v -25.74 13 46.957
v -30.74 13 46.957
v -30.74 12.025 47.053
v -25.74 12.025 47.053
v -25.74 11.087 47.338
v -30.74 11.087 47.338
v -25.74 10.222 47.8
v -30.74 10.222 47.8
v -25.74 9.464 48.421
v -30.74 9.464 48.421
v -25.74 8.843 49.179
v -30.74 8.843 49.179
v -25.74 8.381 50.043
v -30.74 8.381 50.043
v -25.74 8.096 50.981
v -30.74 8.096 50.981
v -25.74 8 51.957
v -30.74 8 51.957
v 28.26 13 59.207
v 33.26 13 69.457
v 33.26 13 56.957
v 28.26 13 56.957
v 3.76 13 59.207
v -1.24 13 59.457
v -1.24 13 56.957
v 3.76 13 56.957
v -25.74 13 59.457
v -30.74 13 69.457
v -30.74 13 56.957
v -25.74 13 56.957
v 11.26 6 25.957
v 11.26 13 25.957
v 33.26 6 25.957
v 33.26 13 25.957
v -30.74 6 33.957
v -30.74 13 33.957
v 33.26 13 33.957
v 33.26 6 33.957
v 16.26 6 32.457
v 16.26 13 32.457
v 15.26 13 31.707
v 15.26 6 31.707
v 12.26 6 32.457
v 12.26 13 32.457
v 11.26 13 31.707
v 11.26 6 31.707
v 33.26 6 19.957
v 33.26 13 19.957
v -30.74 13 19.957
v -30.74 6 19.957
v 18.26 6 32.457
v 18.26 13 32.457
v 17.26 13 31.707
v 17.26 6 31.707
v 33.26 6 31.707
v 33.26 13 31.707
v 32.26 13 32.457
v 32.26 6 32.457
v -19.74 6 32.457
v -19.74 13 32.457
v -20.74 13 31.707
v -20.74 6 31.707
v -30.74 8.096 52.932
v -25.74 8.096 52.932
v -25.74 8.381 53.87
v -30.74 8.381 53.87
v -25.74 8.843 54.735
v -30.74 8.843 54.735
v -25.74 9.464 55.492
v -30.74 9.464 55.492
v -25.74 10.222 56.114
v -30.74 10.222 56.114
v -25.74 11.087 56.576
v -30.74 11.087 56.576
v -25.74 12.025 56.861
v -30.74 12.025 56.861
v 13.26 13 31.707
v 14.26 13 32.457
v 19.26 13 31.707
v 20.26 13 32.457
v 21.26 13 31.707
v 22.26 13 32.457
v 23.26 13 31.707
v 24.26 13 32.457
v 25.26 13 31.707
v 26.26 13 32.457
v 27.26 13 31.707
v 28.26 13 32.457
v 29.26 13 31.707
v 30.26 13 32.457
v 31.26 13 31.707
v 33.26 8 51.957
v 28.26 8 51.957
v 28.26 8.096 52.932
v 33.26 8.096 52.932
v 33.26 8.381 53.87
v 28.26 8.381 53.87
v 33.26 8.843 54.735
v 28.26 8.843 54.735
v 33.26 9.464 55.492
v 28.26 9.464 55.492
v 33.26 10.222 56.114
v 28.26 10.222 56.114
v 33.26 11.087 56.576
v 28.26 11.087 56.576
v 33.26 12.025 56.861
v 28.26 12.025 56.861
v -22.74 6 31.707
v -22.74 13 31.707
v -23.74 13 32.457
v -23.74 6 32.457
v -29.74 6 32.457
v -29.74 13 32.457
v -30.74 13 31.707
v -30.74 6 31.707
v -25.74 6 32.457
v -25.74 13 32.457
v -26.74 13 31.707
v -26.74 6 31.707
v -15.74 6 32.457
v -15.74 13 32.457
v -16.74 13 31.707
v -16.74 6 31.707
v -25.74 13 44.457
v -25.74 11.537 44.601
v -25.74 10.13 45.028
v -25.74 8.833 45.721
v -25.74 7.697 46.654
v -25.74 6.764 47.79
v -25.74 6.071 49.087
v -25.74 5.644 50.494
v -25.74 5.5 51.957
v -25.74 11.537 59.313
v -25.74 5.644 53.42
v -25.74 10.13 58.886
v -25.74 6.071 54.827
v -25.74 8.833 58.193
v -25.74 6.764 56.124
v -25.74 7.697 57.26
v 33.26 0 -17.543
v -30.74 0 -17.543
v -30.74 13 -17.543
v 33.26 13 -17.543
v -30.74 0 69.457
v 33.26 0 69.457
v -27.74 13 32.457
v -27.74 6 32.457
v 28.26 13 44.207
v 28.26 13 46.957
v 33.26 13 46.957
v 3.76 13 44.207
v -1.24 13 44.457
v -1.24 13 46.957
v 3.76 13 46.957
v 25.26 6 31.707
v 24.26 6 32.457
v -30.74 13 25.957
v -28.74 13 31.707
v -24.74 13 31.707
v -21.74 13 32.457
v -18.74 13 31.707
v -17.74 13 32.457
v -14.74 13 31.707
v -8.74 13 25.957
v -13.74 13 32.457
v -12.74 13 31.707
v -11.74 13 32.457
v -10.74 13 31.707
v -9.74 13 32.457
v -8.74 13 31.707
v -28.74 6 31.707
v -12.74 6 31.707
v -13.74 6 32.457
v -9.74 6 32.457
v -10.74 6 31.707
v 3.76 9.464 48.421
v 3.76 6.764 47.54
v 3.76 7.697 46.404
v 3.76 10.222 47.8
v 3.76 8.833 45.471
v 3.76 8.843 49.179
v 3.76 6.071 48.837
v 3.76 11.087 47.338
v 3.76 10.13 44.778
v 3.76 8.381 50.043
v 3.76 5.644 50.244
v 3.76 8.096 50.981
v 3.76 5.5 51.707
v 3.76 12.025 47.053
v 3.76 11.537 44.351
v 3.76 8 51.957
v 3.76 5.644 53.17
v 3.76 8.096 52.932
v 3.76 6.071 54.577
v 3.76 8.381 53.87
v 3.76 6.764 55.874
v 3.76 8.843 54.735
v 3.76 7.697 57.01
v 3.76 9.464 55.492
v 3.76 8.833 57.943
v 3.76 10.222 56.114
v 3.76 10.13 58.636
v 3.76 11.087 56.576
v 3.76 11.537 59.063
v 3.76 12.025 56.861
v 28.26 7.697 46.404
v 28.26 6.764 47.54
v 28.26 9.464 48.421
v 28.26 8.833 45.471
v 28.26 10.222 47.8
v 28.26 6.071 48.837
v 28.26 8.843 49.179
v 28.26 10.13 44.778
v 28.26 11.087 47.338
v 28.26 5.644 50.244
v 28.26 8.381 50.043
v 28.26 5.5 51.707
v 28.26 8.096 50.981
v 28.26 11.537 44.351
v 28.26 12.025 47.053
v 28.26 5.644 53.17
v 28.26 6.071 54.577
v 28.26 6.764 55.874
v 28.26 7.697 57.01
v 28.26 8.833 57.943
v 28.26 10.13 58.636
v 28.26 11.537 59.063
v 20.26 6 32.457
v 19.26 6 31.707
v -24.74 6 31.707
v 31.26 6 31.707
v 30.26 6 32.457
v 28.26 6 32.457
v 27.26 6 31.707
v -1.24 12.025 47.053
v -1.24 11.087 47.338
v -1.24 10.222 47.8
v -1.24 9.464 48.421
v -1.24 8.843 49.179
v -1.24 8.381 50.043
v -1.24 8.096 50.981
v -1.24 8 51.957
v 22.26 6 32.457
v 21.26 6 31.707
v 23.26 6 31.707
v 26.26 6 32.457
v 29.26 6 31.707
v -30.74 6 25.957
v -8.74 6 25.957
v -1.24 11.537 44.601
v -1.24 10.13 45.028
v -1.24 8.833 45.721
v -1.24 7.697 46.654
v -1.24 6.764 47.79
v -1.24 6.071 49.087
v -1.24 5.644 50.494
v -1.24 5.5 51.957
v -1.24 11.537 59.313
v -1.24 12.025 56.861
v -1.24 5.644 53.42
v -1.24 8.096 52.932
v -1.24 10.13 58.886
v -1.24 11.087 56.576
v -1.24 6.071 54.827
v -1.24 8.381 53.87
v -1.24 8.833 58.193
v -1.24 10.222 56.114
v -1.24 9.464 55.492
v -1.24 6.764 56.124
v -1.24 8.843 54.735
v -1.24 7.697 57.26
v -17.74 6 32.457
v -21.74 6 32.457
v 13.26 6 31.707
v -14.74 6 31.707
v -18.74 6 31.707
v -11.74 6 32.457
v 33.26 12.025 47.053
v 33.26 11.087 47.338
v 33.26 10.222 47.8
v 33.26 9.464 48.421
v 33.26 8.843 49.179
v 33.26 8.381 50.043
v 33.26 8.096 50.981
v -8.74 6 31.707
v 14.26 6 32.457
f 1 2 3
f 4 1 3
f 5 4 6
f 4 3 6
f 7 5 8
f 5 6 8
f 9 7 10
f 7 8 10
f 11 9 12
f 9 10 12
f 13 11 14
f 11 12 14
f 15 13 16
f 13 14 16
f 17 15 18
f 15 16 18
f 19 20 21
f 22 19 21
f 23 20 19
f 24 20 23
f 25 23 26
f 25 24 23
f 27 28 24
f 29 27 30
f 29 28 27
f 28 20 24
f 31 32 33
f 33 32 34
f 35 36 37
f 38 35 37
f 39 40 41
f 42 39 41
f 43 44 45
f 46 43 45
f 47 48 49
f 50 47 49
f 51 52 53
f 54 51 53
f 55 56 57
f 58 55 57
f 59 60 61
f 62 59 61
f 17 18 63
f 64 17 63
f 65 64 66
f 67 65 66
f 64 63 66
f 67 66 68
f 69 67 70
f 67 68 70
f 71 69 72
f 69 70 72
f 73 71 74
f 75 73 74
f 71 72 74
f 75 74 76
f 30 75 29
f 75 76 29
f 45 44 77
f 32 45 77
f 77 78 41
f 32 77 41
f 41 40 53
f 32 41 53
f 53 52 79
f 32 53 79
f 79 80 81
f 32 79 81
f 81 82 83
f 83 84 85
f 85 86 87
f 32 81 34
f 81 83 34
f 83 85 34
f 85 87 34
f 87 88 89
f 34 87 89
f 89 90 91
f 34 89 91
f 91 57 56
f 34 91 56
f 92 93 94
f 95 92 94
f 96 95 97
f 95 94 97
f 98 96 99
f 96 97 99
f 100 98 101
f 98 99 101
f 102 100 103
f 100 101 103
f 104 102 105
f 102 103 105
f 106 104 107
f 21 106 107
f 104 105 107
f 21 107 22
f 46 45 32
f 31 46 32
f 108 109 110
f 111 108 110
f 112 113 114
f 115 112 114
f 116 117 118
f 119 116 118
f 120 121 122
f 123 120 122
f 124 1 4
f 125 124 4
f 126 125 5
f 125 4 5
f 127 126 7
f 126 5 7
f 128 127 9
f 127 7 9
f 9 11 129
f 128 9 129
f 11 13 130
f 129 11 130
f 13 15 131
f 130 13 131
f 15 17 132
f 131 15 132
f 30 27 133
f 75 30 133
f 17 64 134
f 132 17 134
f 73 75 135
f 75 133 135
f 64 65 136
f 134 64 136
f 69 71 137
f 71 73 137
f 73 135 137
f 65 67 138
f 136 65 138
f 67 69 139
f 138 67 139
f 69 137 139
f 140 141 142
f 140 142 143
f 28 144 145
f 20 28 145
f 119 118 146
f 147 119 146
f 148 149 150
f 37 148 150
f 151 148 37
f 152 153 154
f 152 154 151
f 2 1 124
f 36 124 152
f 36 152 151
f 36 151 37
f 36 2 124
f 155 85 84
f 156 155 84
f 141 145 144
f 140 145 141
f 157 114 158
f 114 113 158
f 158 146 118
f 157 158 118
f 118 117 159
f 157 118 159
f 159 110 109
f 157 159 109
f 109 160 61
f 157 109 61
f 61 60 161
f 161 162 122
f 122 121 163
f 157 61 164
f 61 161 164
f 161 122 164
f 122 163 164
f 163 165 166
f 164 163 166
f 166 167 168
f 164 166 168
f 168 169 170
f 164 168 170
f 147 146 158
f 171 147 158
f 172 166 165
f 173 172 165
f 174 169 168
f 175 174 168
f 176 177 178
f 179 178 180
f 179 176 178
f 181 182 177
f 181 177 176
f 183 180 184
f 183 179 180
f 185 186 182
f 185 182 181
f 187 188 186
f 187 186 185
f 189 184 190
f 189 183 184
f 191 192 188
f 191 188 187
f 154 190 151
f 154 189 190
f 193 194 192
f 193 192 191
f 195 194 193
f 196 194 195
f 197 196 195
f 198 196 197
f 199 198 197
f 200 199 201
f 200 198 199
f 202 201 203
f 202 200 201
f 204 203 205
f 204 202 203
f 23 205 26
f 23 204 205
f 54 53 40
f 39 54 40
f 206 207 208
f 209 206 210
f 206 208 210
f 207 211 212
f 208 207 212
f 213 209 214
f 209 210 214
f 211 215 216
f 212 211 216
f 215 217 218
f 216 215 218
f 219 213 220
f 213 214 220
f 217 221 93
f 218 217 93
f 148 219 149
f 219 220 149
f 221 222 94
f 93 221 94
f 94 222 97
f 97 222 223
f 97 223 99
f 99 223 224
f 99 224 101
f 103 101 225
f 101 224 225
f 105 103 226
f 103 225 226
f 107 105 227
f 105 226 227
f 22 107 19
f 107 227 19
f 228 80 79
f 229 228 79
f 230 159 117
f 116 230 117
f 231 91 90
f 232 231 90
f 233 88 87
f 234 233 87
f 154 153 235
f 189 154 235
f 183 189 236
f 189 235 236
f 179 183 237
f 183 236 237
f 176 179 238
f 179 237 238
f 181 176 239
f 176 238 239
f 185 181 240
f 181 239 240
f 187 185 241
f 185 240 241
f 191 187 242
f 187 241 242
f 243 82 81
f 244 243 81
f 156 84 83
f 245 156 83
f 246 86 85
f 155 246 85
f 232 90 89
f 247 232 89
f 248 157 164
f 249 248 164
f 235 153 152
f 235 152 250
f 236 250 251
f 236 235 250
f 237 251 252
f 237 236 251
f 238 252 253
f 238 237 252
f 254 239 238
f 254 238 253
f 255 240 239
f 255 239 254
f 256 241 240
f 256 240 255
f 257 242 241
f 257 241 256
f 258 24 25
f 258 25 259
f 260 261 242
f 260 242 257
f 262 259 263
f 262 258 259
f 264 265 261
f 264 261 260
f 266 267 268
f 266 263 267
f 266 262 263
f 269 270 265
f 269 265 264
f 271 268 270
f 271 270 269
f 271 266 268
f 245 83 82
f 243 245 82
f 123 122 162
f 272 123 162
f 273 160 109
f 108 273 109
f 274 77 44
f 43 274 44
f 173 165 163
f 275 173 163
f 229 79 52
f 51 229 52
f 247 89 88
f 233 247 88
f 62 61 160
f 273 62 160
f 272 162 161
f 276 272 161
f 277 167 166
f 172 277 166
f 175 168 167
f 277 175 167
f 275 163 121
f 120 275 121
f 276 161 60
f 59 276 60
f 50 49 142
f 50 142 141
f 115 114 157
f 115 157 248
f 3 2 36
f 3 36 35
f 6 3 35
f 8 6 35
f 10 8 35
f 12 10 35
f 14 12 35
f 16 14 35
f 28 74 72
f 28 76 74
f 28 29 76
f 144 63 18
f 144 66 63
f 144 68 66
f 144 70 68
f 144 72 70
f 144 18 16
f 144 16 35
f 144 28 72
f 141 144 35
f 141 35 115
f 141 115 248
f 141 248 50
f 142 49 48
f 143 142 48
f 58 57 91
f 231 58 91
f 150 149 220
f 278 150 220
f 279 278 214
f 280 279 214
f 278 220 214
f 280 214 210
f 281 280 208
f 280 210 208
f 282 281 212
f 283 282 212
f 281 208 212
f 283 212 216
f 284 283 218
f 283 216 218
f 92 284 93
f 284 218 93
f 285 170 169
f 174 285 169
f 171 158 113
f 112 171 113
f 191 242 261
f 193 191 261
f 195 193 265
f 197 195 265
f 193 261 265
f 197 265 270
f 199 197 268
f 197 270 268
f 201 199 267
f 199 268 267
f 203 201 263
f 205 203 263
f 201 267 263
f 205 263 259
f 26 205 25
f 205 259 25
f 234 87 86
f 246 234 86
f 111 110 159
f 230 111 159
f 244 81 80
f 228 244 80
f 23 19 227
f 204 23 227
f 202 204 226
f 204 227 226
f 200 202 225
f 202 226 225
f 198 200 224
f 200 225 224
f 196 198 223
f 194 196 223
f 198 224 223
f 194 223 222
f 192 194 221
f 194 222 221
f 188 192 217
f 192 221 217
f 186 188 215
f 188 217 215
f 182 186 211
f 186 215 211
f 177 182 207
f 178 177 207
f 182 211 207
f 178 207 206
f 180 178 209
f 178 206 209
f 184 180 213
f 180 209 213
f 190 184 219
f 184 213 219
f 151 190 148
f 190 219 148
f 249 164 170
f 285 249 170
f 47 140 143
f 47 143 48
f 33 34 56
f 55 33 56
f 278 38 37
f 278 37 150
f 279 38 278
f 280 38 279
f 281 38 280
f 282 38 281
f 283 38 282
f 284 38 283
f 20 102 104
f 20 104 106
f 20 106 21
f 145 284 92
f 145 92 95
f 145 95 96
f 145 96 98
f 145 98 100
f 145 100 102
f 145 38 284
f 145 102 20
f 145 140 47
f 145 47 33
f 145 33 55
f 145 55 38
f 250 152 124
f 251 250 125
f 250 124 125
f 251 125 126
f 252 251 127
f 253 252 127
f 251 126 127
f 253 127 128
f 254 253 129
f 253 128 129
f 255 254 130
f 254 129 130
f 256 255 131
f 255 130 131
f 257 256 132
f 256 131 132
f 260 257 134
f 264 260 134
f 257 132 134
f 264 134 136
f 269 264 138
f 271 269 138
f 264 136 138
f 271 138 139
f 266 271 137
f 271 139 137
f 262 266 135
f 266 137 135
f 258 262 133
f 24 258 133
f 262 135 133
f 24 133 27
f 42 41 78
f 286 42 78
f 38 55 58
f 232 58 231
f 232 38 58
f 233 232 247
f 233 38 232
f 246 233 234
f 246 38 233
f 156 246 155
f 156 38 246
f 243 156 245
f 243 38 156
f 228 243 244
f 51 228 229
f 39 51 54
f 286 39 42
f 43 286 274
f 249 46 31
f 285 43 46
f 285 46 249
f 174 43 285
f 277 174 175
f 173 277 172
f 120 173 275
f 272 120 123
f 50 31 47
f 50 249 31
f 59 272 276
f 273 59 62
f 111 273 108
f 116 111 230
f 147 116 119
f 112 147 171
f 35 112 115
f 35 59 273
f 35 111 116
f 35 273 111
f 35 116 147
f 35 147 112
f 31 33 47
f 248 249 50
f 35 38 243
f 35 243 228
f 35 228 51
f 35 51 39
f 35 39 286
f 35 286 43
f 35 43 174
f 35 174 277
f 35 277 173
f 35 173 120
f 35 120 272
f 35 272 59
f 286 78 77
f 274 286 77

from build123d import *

# Parameters (mm, degrees)
F0_W      = 64
F0_H      = 87
F1_DEPTH  = 13
F3_DEPTH  = 7
F5_DEPTH  = 29.5
F7_DEPTH  = 29.5
F9_DEPTH  = 5
F10_DEPTH = 5
F12_DEPTH = 64.001


with BuildPart() as f1:
    # F0 (on Front) → F1 (new body)
    with BuildSketch(Plane.XZ):
        with Locations((1.2601554287, 25.9569030584)):
            Rectangle(F0_W, F0_H)
    extrude(amount=-F1_DEPTH)

    # F2 (on face) → F3 (cut)
    with BuildSketch(Plane(origin=(0, 13, 0), x_dir=(-1, 0, 0), z_dir=(0, 1, 0))):
        Polygon((-11.2601554287, 33.9569030584), (-33.2601554287, 33.9569030584), (-33.2601554287, 31.7069030584), (-32.2601554287, 32.4569030584), (-31.2601554287, 31.7069030584), (-30.2601554287, 32.4569030584), (-29.2601554287, 31.7069030584), (-28.2601554287, 32.4569030584), (-27.2601554287, 31.7069030584), (-26.2601554287, 32.4569030584), (-25.2601554287, 31.7069030584), (-24.2601554287, 32.4569030584), (-23.2601554287, 31.7069030584), (-22.2601554287, 32.4569030584), (-21.2601554287, 31.7069030584), (-20.2601554287, 32.4569030584), (-19.2601554287, 31.7069030584), (-18.2601554287, 32.4569030584), (-17.2601554287, 31.7069030584), (-16.2601554287, 32.4569030584), (-15.2601554287, 31.7069030584), (-14.2601554287, 32.4569030584), (-13.2601554287, 31.7069030584), (-12.2601554287, 32.4569030584), (-11.2601554287, 31.7069030584), align=None)
        Polygon((8.7398445713, 33.9569030584), (-11.2601554287, 33.9569030584), (-11.2601554287, 31.7069030584), (-10.2601554287, 32.4569030584), (-9.2601554287, 31.7069030584), (-8.2601554287, 32.4569030584), (-7.2601554287, 31.7069030584), (-6.2601554287, 32.4569030584), (-5.2601554287, 31.7069030584), (-4.2601554287, 32.4569030584), (-3.2601554287, 31.7069030584), (-2.2601554287, 32.4569030584), (-1.2601554287, 31.7069030584), (-0.2601554287, 32.4569030584), (0.7398445713, 31.7069030584), (1.7398445713, 32.4569030584), (2.7398445713, 31.7069030584), (3.7398445713, 32.4569030584), (4.7398445713, 31.7069030584), (5.7398445713, 32.4569030584), (6.7398445713, 31.7069030584), (7.7398445713, 32.4569030584), (8.7398445713, 31.7069030584), align=None)
        Polygon((-9.2601554287, 31.7069030584), (-11.2601554287, 31.7069030584), (-11.2601554287, 25.9569030584), (8.7398445713, 25.9569030584), (8.7398445713, 31.7069030584), (6.7398445713, 31.7069030584), (4.7398445713, 31.7069030584), (2.7398445713, 31.7069030584), (0.7398445713, 31.7069030584), (-1.2601554287, 31.7069030584), (-3.2601554287, 31.7069030584), (-5.2601554287, 31.7069030584), (-7.2601554287, 31.7069030584), align=None)
        Polygon((30.7398445713, 33.9569030584), (8.7398445713, 33.9569030584), (8.7398445713, 31.7069030584), (9.7398445713, 32.4569030584), (10.7398445713, 31.7069030584), (11.7398445713, 32.4569030584), (12.7398445713, 31.7069030584), (13.7398445713, 32.4569030584), (14.7398445713, 31.7069030584), (15.7398445713, 32.4569030584), (16.7398445713, 31.7069030584), (17.7398445713, 32.4569030584), (18.7398445713, 31.7069030584), (19.7398445713, 32.4569030584), (20.7398445713, 31.7069030584), (21.7398445713, 32.4569030584), (22.7398445713, 31.7069030584), (23.7398445713, 32.4569030584), (24.7398445713, 31.7069030584), (25.7398445713, 32.4569030584), (26.7398445713, 31.7069030584), (27.7398445713, 32.4569030584), (28.7398445713, 31.7069030584), (29.7398445713, 32.4569030584), (30.7398445713, 31.7069030584), align=None)
        Polygon((-11.2601554287, 25.9569030584), (-33.2601554287, 25.9569030584), (-33.2601554287, 19.9569030584), (30.7398445713, 19.9569030584), (30.7398445713, 25.9569030584), (8.7398445713, 25.9569030584), align=None)
        Polygon((6.7398445713, 31.7069030584), (8.7398445713, 31.7069030584), (7.7398445713, 32.4569030584), align=None)
        Polygon((4.7398445713, 31.7069030584), (6.7398445713, 31.7069030584), (5.7398445713, 32.4569030584), align=None)
        Polygon((2.7398445713, 31.7069030584), (4.7398445713, 31.7069030584), (3.7398445713, 32.4569030584), align=None)
        Polygon((0.7398445713, 31.7069030584), (2.7398445713, 31.7069030584), (1.7398445713, 32.4569030584), align=None)
        Polygon((-1.2601554287, 31.7069030584), (0.7398445713, 31.7069030584), (-0.2601554287, 32.4569030584), align=None)
        Polygon((-2.2601554287, 32.4569030584), (-3.2601554287, 31.7069030584), (-1.2601554287, 31.7069030584), align=None)
        Polygon((-6.2601554287, 32.4569030584), (-7.2601554287, 31.7069030584), (-5.2601554287, 31.7069030584), align=None)
        Polygon((-4.2601554287, 32.4569030584), (-5.2601554287, 31.7069030584), (-3.2601554287, 31.7069030584), align=None)
        Polygon((-8.2601554287, 32.4569030584), (-9.2601554287, 31.7069030584), (-7.2601554287, 31.7069030584), align=None)
        Polygon((-10.2601554287, 32.4569030584), (-11.2601554287, 31.7069030584), (-9.2601554287, 31.7069030584), align=None)
    extrude(amount=-F3_DEPTH, mode=Mode.SUBTRACT)

    # F4 (on face) → F5 (cut, through all)
    with BuildSketch(Plane(origin=(-30.7398445713, 0, 0), x_dir=(0, -1, 0), z_dir=(-1, 0, 0))):
        with BuildLine():
            ThreePointArc((-13, 44.4569030584), (-7.6966991411, 46.6536021995), (-5.5, 51.9569030584))
            ThreePointArc((-5.5, 51.9569030584), (-7.6966991411, 57.2602039173), (-13, 59.4569030584))
            Line((-13, 59.4569030584), (-13, 44.4569030584))
        make_face()
    extrude(amount=-F5_DEPTH, mode=Mode.SUBTRACT)

    # F6 (on face) → F7 (cut, through all)
    with BuildSketch(Plane.YZ.offset(33.2601554287)):
        with BuildLine():
            Line((13, 44.2069030584), (13, 59.2069030584))
            ThreePointArc((13, 59.2069030584), (5.5, 51.7069030584), (13, 44.2069030584))
        make_face()
    extrude(amount=-F7_DEPTH, mode=Mode.SUBTRACT)

    # F8 (on face) → F9 (join)
    with BuildSketch(Plane.YZ.offset(33.2601554287)):
        with BuildLine():
            Line((13, 59.2069030584), (13, 64.3319030584))
            Line((13, 64.3319030584), (0, 64.3319030584))
            Line((0, 64.3319030584), (0, 38.0137264729))
            Line((0, 38.0137264729), (13, 38.0137264729))
            Line((13, 38.0137264729), (13, 44.2069030584))
            ThreePointArc((13, 44.2069030584), (5.5, 51.7069030584), (13, 59.2069030584))
        make_face()
        with BuildLine():
            Line((13, 44.2069030584), (13, 59.2069030584))
            ThreePointArc((13, 59.2069030584), (5.5, 51.7069030584), (13, 44.2069030584))
        make_face()
    extrude(amount=-F9_DEPTH)

    # F4 (on face) → F10 (join)
    with BuildSketch(Plane(origin=(-30.7398445713, 0, 0), x_dir=(0, -1, 0), z_dir=(-1, 0, 0))):
        with BuildLine():
            ThreePointArc((-13, 44.4569030584), (-7.6966991411, 46.6536021995), (-5.5, 51.9569030584))
            ThreePointArc((-5.5, 51.9569030584), (-7.6966991411, 57.2602039173), (-13, 59.4569030584))
            Line((-13, 59.4569030584), (-13, 44.4569030584))
        make_face()
    extrude(amount=-F10_DEPTH)

    # F11 (on face) → F12 (cut, through all)
    with BuildSketch(Plane(origin=(-30.7398445713, 0, 0), x_dir=(0, -1, 0), z_dir=(-1, 0, 0))):
        with BuildLine():
            ThreePointArc((-13, 46.9569030584), (-9.4644660941, 48.4213691524), (-8, 51.9569030584))
            ThreePointArc((-8, 51.9569030584), (-9.4644660941, 55.4924369643), (-13, 56.9569030584))
            Line((-13, 56.9569030584), (-13, 46.9569030584))
        make_face()
    extrude(amount=-F12_DEPTH, mode=Mode.SUBTRACT)


solid = f1.part
